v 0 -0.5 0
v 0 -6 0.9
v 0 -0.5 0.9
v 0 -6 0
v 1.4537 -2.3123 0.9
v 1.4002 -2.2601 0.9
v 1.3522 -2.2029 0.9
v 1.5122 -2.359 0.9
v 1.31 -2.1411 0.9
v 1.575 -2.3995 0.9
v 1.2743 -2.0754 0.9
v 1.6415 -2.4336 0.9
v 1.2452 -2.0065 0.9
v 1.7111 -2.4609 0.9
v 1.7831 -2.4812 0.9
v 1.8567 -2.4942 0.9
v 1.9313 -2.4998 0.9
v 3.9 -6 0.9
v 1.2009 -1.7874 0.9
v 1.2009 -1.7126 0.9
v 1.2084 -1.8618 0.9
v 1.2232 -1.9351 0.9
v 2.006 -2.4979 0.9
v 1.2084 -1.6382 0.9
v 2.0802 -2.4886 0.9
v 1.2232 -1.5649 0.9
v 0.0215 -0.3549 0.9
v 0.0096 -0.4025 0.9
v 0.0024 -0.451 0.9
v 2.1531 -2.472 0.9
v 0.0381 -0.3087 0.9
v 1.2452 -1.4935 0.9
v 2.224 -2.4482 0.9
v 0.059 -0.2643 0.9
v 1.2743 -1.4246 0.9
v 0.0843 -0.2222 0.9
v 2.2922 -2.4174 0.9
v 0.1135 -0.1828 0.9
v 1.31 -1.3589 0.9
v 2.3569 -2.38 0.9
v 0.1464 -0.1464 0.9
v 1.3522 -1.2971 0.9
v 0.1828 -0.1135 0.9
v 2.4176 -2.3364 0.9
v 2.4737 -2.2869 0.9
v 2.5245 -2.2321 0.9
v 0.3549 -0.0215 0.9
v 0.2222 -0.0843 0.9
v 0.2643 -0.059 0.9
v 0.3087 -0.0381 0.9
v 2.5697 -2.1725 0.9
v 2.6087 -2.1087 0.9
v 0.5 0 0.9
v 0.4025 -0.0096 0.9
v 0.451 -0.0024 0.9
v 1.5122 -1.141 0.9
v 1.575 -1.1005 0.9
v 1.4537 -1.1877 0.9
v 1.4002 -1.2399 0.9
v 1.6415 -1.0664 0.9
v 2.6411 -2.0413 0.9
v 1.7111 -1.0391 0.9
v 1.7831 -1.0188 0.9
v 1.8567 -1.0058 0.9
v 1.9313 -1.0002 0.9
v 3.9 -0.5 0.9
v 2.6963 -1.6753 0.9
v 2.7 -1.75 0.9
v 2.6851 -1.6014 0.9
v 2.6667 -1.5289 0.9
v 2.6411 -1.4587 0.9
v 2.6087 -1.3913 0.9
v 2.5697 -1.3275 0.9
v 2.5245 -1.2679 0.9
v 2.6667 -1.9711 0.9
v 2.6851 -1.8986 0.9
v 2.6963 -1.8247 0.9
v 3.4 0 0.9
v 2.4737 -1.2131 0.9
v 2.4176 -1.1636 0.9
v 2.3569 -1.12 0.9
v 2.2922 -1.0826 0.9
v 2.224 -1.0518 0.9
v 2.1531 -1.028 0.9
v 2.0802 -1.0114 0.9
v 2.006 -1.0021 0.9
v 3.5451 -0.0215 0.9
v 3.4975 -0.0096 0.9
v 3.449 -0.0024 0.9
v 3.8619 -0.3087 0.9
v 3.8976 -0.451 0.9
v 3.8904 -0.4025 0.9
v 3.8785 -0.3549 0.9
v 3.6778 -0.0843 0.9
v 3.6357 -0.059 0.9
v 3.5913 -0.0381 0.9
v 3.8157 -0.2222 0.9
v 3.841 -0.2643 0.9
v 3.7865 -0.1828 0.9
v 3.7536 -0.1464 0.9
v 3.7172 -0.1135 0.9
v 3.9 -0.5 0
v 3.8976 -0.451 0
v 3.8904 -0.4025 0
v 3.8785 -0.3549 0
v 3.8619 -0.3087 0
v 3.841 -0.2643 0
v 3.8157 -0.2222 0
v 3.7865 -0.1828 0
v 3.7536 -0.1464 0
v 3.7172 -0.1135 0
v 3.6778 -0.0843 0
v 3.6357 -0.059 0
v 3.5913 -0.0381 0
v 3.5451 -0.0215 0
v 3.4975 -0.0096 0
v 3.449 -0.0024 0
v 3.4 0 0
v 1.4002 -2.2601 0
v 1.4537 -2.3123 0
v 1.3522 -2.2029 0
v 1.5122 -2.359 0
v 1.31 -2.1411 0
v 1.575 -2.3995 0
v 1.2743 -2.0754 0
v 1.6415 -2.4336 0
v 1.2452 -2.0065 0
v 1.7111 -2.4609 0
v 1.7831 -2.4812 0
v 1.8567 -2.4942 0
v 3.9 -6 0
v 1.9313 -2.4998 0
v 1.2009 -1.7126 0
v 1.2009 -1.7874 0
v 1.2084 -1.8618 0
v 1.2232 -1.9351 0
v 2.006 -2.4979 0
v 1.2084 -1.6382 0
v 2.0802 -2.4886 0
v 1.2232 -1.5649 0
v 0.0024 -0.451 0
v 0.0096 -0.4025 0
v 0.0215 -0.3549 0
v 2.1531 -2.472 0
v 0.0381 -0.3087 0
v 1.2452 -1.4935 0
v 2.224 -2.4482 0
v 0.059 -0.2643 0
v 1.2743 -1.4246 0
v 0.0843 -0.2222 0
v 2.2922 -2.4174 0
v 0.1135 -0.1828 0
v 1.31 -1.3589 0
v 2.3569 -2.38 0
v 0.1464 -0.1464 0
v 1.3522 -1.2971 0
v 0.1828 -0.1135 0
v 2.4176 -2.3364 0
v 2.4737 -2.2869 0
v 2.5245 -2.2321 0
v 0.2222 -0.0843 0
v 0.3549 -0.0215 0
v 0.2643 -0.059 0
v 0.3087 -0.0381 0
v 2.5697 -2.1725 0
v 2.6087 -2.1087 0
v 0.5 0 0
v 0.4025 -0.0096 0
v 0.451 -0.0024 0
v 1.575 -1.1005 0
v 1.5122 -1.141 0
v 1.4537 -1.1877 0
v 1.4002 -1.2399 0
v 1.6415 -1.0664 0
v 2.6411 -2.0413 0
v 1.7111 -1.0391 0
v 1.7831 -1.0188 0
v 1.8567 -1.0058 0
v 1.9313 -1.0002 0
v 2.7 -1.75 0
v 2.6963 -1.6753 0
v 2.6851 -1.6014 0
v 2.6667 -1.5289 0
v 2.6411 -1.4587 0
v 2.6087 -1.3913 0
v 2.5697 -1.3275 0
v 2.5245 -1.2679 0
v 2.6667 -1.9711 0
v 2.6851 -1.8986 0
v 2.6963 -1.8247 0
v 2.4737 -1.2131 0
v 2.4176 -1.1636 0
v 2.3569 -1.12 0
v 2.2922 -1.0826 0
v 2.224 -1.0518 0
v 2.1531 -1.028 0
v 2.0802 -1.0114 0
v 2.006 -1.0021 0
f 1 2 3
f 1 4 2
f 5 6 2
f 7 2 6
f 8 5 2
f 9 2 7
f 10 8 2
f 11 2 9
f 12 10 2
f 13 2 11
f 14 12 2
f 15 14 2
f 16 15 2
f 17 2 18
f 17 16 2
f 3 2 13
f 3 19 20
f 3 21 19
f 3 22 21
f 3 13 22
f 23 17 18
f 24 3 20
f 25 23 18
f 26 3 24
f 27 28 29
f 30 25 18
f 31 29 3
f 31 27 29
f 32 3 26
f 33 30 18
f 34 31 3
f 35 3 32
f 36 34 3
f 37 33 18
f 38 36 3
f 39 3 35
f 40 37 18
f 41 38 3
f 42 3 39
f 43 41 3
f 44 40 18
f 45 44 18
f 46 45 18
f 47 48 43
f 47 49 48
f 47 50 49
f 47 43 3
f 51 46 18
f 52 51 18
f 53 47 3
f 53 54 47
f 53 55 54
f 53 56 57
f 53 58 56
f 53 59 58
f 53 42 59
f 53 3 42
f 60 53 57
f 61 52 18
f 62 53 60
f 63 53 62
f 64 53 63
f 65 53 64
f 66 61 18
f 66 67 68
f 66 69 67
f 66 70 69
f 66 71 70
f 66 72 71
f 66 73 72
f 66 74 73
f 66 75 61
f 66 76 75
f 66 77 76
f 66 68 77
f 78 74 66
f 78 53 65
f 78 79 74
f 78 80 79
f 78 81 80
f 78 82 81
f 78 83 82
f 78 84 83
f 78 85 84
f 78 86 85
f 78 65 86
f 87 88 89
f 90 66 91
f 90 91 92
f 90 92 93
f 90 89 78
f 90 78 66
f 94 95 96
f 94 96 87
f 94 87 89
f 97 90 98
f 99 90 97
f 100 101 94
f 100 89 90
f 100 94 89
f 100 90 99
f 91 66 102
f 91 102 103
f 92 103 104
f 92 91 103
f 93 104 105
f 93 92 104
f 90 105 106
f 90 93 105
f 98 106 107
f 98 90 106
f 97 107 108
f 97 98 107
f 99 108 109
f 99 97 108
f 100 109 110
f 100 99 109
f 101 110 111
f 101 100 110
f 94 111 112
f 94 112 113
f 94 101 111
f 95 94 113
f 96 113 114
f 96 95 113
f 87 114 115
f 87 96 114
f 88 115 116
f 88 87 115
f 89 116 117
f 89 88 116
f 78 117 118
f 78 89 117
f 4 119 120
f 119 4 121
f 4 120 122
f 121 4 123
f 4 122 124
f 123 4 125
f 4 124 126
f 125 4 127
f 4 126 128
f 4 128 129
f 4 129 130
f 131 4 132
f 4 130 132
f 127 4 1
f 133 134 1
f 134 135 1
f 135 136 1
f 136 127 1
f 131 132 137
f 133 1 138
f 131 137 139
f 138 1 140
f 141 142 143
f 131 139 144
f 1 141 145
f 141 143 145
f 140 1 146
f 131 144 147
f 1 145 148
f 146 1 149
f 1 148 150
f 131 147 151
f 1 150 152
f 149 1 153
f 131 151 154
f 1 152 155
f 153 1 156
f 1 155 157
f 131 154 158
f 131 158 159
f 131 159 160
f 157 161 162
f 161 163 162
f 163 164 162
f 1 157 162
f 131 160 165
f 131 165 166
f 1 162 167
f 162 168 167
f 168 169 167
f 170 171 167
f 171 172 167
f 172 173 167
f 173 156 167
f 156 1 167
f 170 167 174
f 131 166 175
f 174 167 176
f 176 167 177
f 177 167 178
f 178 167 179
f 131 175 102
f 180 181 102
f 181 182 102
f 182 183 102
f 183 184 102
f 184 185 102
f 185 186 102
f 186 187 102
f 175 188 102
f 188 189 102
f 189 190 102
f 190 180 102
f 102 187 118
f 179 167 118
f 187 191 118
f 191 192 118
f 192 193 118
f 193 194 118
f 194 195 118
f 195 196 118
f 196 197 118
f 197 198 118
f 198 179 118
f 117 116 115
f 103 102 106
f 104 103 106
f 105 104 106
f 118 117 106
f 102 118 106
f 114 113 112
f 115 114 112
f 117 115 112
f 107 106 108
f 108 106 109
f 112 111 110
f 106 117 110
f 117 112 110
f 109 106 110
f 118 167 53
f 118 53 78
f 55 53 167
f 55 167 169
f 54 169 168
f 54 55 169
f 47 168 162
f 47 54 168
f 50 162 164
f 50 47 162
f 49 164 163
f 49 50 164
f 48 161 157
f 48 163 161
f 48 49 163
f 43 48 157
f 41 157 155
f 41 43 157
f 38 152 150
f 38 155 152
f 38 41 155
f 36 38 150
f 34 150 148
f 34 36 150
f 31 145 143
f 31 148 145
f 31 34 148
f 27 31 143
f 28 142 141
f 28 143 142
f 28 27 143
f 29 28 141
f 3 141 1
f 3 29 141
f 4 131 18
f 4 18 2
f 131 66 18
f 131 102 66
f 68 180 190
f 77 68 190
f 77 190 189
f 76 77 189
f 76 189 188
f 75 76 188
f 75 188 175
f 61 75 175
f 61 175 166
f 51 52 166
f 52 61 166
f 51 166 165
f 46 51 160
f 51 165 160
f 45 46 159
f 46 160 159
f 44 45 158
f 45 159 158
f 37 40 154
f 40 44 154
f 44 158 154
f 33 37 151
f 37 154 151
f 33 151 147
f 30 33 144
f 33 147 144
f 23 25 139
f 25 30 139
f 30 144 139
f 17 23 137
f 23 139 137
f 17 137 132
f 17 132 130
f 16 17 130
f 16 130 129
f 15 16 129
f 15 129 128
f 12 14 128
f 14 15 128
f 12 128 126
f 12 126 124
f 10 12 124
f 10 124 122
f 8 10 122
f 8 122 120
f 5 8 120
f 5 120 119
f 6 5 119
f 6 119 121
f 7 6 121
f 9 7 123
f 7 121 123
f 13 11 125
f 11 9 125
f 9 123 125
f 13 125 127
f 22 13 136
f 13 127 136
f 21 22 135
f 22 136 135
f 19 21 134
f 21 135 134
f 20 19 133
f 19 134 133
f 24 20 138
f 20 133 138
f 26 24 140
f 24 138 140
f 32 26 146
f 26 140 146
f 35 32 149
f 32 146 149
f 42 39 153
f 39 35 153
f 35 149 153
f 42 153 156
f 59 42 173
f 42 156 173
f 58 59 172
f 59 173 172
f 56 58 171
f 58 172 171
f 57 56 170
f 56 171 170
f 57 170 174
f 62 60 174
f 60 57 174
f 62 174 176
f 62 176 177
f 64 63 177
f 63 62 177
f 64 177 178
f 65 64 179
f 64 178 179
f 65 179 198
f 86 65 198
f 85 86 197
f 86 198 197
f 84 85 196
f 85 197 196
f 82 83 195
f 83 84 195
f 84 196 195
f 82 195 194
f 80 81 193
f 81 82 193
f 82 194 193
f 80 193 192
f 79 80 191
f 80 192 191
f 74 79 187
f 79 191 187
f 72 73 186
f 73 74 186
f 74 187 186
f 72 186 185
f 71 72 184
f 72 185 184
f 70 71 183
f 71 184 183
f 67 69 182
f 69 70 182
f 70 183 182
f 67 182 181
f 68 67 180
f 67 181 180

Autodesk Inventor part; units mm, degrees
ref_plane "YZ Plane" through (0, 0, 0) normal (1, 0, 0) x (0, 1, 0)
ref_plane "XZ Plane" through (0, 0, 0) normal (0, 1, 0) x (-1, 0, 0)
ref_plane "XY Plane" through (0, 0, 0) normal (0, 0, 1) x (1, 0, 0)
sketch "Sketch1" plane through (0, 0, 0) normal (0, 0, 1) x (1, 0, 0)
  line L0 (3.9, 0) -> (3.9, -6)
  line L1 (3.9, -6) -> (0, -6)
  line L2 (0, -6) -> (0, 0)
  line L3 (0.2186, 0) -> (3.3134, 0) construction
  line L4 (0.2186, -1) -> (3.3134, -1) construction
  line L5 (0.2186, -1.75) -> (3.3134, -1.75) construction
  line L6 (0, 1.467) -> (0, -3.9093) construction
  line L7 (1.95, 1.467) -> (1.95, -3.9093) construction
  circle A0 centre (1.95, -1.75) radius 0.75
  line L8 (0, 0) -> (3.9, 0)
  dimension "d0" = 3.9
  dimension "d1" = 6
  dimension "d2" = 1
  dimension "d3" = 0.75
  dimension "d4" = 1.95
  dimension "d5" = 1.5
extrude "Extrusion1" add sketch "Sketch1" along normal blind 0.9
fillet "Fillet1" radius 0.5 2 edges at (3.9, 0, 0.45) (0, 0, 0.45)
properties part number "Limit switch pin" material "Stainless Steel"
